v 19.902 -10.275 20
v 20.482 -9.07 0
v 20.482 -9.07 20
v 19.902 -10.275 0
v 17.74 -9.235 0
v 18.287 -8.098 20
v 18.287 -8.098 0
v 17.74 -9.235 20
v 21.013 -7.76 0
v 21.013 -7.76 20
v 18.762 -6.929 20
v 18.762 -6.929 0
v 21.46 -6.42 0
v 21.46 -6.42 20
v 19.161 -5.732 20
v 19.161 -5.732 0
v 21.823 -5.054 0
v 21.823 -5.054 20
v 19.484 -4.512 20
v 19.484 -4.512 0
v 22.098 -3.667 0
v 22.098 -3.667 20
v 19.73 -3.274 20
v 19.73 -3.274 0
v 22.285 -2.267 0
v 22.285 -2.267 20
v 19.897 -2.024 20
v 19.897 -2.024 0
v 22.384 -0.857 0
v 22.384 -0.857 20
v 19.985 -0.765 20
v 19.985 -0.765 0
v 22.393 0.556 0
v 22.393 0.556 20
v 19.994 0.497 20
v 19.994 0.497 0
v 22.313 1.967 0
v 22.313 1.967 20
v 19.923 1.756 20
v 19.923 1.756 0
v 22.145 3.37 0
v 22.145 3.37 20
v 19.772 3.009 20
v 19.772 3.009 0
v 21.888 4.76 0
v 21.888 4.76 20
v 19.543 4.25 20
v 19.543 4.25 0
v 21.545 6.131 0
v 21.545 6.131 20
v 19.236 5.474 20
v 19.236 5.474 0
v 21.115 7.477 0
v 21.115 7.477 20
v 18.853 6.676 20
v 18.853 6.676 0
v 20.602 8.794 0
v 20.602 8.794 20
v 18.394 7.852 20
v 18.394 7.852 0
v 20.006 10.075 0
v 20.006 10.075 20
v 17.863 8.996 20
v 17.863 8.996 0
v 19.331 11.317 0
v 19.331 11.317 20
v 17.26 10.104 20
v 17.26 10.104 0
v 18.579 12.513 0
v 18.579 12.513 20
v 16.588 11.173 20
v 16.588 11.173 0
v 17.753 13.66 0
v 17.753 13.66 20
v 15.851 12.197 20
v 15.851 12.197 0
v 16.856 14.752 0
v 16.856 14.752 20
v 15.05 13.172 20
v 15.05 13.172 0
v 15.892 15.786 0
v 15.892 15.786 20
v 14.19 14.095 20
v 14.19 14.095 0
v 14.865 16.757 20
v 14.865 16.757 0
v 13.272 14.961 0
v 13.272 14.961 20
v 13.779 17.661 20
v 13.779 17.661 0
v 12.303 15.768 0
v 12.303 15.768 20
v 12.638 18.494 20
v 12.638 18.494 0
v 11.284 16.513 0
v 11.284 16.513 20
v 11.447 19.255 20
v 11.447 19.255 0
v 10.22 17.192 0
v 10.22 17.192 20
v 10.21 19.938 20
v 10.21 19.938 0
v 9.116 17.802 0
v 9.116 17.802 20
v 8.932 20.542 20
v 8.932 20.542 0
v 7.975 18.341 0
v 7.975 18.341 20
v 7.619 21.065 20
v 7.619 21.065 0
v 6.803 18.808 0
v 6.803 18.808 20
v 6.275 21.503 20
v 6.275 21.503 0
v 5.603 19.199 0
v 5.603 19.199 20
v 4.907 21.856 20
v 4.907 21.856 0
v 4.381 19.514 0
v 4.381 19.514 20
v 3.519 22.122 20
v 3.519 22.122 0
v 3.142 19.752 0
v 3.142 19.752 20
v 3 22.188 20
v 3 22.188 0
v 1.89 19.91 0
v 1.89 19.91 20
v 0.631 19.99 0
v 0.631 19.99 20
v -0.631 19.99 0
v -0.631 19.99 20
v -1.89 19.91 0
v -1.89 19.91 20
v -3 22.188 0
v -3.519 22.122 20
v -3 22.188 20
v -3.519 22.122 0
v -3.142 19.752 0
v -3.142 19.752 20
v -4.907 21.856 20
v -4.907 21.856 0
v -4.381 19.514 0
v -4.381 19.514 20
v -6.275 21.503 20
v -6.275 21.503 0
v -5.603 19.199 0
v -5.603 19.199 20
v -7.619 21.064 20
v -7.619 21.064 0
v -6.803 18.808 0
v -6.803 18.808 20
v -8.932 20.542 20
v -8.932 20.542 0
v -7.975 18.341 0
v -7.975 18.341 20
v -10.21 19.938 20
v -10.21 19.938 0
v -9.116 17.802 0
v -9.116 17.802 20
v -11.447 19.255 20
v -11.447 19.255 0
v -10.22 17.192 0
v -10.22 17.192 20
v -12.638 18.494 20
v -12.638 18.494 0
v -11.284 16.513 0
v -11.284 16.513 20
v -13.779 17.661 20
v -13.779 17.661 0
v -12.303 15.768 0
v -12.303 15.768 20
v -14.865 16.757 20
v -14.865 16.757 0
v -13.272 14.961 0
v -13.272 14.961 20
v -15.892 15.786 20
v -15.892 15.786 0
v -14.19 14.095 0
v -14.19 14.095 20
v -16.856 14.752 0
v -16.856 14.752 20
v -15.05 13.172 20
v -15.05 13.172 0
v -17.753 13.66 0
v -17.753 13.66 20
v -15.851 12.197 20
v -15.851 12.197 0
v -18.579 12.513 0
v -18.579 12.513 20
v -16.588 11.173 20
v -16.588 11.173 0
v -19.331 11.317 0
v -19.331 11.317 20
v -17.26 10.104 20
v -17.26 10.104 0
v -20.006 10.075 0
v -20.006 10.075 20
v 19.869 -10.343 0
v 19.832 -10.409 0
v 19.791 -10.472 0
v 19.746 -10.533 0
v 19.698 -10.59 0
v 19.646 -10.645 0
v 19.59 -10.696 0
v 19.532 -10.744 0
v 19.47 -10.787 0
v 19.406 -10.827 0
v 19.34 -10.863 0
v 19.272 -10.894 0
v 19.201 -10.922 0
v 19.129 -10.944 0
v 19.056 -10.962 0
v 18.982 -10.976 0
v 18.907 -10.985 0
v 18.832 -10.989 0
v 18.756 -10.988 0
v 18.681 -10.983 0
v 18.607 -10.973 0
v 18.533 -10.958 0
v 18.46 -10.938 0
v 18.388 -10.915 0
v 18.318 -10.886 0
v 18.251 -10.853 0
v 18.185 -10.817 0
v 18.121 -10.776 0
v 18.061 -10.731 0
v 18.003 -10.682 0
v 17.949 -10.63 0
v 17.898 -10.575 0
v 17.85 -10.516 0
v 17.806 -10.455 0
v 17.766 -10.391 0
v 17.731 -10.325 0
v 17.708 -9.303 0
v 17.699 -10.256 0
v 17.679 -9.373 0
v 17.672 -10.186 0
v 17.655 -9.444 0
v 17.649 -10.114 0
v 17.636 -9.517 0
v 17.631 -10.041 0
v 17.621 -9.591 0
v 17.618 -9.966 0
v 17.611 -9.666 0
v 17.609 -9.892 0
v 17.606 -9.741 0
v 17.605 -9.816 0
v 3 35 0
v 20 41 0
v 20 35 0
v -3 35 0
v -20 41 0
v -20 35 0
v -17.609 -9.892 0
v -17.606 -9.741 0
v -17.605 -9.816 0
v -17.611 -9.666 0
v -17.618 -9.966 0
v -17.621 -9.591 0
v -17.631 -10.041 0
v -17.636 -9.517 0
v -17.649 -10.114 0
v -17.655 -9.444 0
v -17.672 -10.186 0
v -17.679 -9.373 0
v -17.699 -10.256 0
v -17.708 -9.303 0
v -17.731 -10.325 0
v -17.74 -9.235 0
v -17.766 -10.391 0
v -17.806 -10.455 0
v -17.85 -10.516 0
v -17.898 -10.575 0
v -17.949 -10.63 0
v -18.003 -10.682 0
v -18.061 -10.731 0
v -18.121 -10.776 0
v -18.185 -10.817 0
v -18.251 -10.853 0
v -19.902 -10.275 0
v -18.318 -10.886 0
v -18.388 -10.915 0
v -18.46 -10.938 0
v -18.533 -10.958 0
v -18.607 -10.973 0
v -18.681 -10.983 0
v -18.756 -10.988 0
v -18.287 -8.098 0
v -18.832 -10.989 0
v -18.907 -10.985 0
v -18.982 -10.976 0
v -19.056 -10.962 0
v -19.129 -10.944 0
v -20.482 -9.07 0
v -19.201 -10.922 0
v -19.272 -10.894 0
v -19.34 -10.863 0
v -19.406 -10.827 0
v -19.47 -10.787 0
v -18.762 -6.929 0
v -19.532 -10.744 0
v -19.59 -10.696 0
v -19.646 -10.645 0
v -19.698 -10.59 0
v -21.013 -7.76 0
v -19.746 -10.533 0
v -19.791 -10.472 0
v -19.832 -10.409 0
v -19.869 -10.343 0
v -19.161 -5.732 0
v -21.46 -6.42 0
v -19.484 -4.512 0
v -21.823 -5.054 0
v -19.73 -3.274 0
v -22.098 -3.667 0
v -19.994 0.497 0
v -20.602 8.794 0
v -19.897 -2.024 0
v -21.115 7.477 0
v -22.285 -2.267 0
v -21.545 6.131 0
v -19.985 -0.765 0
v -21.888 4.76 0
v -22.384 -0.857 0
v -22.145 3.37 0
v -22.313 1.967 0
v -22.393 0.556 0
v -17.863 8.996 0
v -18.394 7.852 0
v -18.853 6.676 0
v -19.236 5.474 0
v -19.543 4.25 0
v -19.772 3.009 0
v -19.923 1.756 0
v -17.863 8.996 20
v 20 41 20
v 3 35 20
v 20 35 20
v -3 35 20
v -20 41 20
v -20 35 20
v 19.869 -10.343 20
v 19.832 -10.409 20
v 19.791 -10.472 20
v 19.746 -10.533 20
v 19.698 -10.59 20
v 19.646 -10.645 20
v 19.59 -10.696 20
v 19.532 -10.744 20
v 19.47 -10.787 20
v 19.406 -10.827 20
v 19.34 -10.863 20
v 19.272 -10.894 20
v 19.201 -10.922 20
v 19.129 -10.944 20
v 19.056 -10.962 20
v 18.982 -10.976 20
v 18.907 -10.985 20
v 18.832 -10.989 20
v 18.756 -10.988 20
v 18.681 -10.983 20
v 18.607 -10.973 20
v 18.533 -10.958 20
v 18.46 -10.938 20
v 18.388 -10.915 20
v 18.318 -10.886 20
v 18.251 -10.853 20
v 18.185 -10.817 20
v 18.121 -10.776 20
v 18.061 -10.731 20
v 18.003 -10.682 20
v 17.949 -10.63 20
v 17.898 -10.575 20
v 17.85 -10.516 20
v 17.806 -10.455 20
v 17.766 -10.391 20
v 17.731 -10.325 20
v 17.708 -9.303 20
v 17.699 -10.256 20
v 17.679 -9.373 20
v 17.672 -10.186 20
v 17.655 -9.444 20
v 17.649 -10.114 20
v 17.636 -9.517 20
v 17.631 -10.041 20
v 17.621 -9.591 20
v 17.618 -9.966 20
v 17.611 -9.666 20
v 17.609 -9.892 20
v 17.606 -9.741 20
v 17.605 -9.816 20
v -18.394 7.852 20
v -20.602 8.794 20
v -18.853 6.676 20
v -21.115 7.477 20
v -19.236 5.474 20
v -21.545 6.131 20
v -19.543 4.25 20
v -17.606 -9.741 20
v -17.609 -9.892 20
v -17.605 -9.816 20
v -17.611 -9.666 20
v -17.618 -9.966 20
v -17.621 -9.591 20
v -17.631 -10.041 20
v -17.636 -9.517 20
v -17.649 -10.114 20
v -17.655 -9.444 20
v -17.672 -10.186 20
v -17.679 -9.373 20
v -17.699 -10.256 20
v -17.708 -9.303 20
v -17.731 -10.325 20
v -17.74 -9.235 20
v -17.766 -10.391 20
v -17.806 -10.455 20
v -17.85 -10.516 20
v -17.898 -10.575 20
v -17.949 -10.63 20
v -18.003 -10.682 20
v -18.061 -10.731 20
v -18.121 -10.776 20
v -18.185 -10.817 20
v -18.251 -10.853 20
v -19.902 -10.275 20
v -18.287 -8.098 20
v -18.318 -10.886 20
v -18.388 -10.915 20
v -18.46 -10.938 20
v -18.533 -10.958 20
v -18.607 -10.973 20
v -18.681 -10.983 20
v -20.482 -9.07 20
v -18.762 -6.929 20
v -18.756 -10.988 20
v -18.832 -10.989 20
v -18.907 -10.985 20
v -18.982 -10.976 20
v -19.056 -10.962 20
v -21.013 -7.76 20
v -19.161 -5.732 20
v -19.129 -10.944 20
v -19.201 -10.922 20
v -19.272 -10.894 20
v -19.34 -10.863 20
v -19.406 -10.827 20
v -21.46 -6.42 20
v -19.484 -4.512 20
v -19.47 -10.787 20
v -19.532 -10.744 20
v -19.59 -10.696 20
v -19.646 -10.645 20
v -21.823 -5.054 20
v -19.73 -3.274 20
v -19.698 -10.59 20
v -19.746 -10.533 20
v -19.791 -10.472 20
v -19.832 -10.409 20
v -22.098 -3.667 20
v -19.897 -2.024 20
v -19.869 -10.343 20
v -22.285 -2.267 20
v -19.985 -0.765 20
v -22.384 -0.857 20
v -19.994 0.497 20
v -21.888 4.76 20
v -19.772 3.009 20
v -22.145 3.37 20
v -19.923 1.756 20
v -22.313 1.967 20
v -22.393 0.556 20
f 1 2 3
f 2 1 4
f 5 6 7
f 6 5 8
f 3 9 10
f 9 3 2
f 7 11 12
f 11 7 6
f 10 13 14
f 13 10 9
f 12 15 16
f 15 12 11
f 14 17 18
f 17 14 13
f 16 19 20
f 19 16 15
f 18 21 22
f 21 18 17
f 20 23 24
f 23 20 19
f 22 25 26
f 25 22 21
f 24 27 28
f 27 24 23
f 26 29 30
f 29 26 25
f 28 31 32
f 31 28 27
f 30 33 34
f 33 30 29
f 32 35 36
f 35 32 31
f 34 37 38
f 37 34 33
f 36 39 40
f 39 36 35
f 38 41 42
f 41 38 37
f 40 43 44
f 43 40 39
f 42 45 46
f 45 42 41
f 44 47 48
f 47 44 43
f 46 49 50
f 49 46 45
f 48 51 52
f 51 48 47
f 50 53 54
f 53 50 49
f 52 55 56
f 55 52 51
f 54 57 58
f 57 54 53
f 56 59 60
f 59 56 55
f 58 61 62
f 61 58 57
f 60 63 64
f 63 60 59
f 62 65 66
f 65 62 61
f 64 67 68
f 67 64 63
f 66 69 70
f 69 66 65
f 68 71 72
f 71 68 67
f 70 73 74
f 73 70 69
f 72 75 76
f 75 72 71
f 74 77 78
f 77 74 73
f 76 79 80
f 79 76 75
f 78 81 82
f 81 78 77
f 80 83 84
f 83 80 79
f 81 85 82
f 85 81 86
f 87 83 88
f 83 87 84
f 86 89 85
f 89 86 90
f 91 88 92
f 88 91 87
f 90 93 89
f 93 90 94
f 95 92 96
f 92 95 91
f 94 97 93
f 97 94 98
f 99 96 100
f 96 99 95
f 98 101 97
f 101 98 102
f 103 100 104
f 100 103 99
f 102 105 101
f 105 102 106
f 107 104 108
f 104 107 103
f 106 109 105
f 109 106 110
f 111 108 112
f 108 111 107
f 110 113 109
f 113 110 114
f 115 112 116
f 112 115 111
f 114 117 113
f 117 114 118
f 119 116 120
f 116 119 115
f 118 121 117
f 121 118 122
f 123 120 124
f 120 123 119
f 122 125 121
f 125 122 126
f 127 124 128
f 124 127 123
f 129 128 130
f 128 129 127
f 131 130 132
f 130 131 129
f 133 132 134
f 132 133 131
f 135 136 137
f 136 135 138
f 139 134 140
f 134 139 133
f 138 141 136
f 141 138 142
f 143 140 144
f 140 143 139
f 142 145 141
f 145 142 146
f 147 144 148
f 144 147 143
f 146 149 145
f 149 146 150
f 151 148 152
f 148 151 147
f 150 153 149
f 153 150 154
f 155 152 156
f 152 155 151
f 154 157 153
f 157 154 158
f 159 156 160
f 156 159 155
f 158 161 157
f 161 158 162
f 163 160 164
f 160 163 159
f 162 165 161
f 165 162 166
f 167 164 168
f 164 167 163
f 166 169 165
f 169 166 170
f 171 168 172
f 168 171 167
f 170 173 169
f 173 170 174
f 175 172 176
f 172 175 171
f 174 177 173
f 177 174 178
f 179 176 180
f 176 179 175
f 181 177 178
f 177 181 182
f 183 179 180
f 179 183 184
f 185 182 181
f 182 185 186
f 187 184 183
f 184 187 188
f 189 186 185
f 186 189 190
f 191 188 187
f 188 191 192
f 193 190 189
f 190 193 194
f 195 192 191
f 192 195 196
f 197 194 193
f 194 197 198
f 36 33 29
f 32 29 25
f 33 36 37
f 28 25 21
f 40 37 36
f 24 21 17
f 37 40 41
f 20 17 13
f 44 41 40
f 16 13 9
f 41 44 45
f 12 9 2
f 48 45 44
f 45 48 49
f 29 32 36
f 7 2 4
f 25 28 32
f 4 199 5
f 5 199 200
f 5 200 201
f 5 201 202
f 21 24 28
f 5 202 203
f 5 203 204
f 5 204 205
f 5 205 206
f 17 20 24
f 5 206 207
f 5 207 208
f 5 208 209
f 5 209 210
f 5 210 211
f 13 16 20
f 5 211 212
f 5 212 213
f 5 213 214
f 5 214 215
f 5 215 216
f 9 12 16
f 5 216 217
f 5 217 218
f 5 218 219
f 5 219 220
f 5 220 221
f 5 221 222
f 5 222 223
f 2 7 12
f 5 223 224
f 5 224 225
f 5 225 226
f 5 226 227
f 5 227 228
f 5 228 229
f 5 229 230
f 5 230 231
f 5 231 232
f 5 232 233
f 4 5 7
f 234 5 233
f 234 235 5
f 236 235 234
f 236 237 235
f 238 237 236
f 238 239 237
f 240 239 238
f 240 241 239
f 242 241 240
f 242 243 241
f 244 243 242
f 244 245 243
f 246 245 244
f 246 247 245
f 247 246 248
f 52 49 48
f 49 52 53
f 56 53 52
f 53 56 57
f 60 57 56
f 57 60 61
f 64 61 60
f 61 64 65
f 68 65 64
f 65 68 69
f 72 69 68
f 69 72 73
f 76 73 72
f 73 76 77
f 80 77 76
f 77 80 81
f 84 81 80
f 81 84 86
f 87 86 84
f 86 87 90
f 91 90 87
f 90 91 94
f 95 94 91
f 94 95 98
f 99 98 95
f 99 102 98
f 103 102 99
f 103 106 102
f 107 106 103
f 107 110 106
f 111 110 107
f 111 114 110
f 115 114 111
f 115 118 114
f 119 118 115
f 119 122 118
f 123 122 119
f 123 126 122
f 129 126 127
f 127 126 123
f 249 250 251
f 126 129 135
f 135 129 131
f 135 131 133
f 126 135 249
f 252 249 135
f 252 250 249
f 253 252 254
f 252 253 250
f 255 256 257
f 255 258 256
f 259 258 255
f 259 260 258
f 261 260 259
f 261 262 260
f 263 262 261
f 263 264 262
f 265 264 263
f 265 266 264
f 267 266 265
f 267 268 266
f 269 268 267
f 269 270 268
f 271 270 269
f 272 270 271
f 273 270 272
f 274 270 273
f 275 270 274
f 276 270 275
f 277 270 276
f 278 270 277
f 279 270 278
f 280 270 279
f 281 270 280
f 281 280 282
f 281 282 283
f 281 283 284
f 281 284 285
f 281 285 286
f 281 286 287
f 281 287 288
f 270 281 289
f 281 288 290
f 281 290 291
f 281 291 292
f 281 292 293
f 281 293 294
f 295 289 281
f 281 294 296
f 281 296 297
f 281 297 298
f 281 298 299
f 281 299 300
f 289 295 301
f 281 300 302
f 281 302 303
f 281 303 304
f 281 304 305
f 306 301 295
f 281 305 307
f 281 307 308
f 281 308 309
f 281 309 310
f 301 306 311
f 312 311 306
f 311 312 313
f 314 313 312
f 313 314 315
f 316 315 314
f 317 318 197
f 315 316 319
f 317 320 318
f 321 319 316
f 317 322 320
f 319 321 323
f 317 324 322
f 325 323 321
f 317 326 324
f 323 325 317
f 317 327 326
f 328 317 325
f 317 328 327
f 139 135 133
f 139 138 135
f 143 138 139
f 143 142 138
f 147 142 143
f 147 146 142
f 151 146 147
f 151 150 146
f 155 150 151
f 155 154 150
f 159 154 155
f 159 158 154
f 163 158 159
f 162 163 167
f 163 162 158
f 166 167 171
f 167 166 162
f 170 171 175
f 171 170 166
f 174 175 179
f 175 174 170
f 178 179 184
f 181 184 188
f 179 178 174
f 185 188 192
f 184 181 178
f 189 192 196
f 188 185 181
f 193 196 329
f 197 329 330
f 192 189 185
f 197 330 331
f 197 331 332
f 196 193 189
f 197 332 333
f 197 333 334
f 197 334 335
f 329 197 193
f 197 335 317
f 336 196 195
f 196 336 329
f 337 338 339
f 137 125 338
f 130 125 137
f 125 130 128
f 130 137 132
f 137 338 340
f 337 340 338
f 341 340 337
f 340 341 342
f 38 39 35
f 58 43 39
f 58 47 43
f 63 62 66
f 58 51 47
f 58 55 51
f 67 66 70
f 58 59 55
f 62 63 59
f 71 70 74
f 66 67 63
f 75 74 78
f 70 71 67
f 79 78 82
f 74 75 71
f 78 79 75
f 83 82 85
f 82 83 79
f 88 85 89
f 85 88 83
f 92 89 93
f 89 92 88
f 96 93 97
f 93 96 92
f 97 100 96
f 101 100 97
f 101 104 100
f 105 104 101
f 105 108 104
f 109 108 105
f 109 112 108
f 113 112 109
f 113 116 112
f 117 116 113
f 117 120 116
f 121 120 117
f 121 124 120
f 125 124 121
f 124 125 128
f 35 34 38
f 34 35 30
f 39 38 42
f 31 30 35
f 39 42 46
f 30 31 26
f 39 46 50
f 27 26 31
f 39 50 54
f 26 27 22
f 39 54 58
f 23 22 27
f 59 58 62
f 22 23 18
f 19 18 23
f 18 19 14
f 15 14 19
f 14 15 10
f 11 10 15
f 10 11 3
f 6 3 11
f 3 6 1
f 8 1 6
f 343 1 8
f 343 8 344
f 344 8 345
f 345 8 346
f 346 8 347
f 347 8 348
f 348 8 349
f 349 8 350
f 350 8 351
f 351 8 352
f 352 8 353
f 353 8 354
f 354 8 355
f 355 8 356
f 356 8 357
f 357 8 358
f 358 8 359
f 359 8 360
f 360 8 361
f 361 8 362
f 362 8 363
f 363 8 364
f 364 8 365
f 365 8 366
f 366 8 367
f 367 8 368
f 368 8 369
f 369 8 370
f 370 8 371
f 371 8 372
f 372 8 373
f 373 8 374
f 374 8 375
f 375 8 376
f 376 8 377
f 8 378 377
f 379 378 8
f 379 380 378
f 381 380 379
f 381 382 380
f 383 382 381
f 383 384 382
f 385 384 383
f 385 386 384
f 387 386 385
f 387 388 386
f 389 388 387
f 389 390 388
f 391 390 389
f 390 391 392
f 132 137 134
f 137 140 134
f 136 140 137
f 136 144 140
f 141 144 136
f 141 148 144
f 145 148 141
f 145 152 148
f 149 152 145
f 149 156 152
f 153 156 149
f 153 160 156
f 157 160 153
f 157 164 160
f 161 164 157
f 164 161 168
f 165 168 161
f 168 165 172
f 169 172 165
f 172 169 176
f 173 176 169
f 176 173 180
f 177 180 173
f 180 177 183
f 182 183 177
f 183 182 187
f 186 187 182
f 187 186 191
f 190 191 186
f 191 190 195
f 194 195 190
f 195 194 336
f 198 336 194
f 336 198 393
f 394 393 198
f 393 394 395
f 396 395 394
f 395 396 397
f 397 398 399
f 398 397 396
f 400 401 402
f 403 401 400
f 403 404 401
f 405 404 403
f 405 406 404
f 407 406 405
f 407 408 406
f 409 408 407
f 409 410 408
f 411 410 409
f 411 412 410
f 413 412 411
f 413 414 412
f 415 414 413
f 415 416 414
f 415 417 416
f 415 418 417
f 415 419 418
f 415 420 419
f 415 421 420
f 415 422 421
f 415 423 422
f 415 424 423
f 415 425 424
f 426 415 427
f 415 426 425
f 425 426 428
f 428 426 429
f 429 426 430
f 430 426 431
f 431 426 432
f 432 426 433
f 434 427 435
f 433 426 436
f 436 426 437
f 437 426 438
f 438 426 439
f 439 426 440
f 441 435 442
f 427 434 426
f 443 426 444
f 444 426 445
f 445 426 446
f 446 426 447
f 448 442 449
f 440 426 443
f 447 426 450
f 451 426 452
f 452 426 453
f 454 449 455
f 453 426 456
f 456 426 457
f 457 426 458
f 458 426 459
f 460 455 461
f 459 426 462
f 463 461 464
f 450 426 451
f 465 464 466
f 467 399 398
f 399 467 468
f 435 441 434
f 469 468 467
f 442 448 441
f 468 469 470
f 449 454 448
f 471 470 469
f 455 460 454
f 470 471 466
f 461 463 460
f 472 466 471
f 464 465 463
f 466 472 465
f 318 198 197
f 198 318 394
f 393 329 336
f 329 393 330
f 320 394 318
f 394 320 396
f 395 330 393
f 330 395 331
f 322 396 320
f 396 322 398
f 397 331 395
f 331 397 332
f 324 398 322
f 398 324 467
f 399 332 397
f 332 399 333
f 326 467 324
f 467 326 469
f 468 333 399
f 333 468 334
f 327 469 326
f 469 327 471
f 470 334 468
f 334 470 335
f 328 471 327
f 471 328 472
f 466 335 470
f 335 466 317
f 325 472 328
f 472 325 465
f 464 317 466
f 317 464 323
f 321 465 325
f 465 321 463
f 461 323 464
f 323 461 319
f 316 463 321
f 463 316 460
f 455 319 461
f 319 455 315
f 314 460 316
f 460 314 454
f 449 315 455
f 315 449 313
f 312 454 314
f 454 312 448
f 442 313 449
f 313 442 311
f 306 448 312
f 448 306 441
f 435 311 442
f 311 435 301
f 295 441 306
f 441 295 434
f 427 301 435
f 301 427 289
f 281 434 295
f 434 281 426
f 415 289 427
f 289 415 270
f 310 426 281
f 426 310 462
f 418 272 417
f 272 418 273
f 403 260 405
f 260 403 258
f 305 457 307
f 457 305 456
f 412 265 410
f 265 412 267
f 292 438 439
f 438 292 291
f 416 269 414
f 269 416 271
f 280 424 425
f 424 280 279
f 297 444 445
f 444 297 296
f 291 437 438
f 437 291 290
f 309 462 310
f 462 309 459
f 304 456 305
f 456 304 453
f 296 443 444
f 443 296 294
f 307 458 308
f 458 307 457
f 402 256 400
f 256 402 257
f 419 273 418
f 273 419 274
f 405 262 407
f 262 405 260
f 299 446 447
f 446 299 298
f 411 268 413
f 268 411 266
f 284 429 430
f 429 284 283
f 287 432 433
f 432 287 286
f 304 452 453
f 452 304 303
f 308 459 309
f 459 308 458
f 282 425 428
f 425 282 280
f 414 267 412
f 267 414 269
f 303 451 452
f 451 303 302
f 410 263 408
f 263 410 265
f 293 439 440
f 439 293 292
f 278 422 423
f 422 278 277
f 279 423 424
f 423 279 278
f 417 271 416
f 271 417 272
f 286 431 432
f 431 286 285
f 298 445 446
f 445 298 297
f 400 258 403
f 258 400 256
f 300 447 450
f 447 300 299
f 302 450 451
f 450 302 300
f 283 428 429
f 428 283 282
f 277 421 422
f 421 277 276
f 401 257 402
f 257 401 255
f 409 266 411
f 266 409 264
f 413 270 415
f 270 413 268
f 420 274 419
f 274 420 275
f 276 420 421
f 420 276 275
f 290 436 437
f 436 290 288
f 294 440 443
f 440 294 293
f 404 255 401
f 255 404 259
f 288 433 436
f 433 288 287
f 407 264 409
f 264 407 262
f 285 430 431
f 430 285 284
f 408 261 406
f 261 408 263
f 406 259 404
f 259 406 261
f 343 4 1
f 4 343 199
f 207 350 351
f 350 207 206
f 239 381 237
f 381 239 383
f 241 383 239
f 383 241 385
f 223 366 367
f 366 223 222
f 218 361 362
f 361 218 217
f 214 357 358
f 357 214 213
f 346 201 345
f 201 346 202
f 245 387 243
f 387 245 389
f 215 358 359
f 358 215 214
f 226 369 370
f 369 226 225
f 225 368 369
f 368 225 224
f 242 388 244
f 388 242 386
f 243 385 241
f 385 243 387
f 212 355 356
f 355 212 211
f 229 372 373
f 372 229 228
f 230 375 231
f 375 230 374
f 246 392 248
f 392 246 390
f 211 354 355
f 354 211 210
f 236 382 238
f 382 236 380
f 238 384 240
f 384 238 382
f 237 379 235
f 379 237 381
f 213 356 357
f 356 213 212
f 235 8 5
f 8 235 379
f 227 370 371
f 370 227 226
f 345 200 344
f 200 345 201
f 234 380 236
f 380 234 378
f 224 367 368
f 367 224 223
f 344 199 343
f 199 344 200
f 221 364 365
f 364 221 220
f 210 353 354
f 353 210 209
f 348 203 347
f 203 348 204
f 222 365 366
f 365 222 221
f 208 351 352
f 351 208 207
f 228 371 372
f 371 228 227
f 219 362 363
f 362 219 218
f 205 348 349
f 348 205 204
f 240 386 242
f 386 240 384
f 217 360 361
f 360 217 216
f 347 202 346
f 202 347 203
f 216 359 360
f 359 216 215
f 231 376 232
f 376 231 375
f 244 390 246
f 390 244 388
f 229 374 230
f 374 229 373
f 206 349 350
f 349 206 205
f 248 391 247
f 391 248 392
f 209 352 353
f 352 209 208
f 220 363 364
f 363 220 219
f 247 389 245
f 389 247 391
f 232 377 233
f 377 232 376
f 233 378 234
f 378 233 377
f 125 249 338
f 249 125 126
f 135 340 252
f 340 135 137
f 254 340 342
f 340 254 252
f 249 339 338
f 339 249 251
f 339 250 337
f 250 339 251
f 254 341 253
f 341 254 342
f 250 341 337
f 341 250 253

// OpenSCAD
height=20;
thick=6;
holeThick=2.4;
holeAngle=235;
holeRadius=20;
neckLength=15;

module door_stopper(type){
    // head
    if (type == str("female")){
        rotate([0,0,(180-holeAngle)/2]){
            rotate_extrude(angle=holeAngle, $fn=100)
                translate([holeRadius,0,0])
                    square([holeThick,height]);
                
            rotate([0,0,holeAngle])
                translate([holeRadius+holeThick/2,0,0])
                cylinder(h=height, d=holeThick, $fn=100);    
                
            translate([holeRadius+holeThick/2,0,0])
                cylinder(h=height, d=holeThick, $fn=100);    
        }
    }
    if (type == str("male")){
        translate([0,holeThick,0])
            cylinder(h=height, r=holeRadius, $fn=100);
    }

    // neck
    translate([-thick/2,holeRadius,0])
        cube([thick,neckLength,height]);

    // body
    translate([-holeRadius,holeRadius+neckLength,0])
    cube([holeRadius*2,thick,height]);
}

door_stopper(type=str("female"));
//door_stopper(type=str("male"));
